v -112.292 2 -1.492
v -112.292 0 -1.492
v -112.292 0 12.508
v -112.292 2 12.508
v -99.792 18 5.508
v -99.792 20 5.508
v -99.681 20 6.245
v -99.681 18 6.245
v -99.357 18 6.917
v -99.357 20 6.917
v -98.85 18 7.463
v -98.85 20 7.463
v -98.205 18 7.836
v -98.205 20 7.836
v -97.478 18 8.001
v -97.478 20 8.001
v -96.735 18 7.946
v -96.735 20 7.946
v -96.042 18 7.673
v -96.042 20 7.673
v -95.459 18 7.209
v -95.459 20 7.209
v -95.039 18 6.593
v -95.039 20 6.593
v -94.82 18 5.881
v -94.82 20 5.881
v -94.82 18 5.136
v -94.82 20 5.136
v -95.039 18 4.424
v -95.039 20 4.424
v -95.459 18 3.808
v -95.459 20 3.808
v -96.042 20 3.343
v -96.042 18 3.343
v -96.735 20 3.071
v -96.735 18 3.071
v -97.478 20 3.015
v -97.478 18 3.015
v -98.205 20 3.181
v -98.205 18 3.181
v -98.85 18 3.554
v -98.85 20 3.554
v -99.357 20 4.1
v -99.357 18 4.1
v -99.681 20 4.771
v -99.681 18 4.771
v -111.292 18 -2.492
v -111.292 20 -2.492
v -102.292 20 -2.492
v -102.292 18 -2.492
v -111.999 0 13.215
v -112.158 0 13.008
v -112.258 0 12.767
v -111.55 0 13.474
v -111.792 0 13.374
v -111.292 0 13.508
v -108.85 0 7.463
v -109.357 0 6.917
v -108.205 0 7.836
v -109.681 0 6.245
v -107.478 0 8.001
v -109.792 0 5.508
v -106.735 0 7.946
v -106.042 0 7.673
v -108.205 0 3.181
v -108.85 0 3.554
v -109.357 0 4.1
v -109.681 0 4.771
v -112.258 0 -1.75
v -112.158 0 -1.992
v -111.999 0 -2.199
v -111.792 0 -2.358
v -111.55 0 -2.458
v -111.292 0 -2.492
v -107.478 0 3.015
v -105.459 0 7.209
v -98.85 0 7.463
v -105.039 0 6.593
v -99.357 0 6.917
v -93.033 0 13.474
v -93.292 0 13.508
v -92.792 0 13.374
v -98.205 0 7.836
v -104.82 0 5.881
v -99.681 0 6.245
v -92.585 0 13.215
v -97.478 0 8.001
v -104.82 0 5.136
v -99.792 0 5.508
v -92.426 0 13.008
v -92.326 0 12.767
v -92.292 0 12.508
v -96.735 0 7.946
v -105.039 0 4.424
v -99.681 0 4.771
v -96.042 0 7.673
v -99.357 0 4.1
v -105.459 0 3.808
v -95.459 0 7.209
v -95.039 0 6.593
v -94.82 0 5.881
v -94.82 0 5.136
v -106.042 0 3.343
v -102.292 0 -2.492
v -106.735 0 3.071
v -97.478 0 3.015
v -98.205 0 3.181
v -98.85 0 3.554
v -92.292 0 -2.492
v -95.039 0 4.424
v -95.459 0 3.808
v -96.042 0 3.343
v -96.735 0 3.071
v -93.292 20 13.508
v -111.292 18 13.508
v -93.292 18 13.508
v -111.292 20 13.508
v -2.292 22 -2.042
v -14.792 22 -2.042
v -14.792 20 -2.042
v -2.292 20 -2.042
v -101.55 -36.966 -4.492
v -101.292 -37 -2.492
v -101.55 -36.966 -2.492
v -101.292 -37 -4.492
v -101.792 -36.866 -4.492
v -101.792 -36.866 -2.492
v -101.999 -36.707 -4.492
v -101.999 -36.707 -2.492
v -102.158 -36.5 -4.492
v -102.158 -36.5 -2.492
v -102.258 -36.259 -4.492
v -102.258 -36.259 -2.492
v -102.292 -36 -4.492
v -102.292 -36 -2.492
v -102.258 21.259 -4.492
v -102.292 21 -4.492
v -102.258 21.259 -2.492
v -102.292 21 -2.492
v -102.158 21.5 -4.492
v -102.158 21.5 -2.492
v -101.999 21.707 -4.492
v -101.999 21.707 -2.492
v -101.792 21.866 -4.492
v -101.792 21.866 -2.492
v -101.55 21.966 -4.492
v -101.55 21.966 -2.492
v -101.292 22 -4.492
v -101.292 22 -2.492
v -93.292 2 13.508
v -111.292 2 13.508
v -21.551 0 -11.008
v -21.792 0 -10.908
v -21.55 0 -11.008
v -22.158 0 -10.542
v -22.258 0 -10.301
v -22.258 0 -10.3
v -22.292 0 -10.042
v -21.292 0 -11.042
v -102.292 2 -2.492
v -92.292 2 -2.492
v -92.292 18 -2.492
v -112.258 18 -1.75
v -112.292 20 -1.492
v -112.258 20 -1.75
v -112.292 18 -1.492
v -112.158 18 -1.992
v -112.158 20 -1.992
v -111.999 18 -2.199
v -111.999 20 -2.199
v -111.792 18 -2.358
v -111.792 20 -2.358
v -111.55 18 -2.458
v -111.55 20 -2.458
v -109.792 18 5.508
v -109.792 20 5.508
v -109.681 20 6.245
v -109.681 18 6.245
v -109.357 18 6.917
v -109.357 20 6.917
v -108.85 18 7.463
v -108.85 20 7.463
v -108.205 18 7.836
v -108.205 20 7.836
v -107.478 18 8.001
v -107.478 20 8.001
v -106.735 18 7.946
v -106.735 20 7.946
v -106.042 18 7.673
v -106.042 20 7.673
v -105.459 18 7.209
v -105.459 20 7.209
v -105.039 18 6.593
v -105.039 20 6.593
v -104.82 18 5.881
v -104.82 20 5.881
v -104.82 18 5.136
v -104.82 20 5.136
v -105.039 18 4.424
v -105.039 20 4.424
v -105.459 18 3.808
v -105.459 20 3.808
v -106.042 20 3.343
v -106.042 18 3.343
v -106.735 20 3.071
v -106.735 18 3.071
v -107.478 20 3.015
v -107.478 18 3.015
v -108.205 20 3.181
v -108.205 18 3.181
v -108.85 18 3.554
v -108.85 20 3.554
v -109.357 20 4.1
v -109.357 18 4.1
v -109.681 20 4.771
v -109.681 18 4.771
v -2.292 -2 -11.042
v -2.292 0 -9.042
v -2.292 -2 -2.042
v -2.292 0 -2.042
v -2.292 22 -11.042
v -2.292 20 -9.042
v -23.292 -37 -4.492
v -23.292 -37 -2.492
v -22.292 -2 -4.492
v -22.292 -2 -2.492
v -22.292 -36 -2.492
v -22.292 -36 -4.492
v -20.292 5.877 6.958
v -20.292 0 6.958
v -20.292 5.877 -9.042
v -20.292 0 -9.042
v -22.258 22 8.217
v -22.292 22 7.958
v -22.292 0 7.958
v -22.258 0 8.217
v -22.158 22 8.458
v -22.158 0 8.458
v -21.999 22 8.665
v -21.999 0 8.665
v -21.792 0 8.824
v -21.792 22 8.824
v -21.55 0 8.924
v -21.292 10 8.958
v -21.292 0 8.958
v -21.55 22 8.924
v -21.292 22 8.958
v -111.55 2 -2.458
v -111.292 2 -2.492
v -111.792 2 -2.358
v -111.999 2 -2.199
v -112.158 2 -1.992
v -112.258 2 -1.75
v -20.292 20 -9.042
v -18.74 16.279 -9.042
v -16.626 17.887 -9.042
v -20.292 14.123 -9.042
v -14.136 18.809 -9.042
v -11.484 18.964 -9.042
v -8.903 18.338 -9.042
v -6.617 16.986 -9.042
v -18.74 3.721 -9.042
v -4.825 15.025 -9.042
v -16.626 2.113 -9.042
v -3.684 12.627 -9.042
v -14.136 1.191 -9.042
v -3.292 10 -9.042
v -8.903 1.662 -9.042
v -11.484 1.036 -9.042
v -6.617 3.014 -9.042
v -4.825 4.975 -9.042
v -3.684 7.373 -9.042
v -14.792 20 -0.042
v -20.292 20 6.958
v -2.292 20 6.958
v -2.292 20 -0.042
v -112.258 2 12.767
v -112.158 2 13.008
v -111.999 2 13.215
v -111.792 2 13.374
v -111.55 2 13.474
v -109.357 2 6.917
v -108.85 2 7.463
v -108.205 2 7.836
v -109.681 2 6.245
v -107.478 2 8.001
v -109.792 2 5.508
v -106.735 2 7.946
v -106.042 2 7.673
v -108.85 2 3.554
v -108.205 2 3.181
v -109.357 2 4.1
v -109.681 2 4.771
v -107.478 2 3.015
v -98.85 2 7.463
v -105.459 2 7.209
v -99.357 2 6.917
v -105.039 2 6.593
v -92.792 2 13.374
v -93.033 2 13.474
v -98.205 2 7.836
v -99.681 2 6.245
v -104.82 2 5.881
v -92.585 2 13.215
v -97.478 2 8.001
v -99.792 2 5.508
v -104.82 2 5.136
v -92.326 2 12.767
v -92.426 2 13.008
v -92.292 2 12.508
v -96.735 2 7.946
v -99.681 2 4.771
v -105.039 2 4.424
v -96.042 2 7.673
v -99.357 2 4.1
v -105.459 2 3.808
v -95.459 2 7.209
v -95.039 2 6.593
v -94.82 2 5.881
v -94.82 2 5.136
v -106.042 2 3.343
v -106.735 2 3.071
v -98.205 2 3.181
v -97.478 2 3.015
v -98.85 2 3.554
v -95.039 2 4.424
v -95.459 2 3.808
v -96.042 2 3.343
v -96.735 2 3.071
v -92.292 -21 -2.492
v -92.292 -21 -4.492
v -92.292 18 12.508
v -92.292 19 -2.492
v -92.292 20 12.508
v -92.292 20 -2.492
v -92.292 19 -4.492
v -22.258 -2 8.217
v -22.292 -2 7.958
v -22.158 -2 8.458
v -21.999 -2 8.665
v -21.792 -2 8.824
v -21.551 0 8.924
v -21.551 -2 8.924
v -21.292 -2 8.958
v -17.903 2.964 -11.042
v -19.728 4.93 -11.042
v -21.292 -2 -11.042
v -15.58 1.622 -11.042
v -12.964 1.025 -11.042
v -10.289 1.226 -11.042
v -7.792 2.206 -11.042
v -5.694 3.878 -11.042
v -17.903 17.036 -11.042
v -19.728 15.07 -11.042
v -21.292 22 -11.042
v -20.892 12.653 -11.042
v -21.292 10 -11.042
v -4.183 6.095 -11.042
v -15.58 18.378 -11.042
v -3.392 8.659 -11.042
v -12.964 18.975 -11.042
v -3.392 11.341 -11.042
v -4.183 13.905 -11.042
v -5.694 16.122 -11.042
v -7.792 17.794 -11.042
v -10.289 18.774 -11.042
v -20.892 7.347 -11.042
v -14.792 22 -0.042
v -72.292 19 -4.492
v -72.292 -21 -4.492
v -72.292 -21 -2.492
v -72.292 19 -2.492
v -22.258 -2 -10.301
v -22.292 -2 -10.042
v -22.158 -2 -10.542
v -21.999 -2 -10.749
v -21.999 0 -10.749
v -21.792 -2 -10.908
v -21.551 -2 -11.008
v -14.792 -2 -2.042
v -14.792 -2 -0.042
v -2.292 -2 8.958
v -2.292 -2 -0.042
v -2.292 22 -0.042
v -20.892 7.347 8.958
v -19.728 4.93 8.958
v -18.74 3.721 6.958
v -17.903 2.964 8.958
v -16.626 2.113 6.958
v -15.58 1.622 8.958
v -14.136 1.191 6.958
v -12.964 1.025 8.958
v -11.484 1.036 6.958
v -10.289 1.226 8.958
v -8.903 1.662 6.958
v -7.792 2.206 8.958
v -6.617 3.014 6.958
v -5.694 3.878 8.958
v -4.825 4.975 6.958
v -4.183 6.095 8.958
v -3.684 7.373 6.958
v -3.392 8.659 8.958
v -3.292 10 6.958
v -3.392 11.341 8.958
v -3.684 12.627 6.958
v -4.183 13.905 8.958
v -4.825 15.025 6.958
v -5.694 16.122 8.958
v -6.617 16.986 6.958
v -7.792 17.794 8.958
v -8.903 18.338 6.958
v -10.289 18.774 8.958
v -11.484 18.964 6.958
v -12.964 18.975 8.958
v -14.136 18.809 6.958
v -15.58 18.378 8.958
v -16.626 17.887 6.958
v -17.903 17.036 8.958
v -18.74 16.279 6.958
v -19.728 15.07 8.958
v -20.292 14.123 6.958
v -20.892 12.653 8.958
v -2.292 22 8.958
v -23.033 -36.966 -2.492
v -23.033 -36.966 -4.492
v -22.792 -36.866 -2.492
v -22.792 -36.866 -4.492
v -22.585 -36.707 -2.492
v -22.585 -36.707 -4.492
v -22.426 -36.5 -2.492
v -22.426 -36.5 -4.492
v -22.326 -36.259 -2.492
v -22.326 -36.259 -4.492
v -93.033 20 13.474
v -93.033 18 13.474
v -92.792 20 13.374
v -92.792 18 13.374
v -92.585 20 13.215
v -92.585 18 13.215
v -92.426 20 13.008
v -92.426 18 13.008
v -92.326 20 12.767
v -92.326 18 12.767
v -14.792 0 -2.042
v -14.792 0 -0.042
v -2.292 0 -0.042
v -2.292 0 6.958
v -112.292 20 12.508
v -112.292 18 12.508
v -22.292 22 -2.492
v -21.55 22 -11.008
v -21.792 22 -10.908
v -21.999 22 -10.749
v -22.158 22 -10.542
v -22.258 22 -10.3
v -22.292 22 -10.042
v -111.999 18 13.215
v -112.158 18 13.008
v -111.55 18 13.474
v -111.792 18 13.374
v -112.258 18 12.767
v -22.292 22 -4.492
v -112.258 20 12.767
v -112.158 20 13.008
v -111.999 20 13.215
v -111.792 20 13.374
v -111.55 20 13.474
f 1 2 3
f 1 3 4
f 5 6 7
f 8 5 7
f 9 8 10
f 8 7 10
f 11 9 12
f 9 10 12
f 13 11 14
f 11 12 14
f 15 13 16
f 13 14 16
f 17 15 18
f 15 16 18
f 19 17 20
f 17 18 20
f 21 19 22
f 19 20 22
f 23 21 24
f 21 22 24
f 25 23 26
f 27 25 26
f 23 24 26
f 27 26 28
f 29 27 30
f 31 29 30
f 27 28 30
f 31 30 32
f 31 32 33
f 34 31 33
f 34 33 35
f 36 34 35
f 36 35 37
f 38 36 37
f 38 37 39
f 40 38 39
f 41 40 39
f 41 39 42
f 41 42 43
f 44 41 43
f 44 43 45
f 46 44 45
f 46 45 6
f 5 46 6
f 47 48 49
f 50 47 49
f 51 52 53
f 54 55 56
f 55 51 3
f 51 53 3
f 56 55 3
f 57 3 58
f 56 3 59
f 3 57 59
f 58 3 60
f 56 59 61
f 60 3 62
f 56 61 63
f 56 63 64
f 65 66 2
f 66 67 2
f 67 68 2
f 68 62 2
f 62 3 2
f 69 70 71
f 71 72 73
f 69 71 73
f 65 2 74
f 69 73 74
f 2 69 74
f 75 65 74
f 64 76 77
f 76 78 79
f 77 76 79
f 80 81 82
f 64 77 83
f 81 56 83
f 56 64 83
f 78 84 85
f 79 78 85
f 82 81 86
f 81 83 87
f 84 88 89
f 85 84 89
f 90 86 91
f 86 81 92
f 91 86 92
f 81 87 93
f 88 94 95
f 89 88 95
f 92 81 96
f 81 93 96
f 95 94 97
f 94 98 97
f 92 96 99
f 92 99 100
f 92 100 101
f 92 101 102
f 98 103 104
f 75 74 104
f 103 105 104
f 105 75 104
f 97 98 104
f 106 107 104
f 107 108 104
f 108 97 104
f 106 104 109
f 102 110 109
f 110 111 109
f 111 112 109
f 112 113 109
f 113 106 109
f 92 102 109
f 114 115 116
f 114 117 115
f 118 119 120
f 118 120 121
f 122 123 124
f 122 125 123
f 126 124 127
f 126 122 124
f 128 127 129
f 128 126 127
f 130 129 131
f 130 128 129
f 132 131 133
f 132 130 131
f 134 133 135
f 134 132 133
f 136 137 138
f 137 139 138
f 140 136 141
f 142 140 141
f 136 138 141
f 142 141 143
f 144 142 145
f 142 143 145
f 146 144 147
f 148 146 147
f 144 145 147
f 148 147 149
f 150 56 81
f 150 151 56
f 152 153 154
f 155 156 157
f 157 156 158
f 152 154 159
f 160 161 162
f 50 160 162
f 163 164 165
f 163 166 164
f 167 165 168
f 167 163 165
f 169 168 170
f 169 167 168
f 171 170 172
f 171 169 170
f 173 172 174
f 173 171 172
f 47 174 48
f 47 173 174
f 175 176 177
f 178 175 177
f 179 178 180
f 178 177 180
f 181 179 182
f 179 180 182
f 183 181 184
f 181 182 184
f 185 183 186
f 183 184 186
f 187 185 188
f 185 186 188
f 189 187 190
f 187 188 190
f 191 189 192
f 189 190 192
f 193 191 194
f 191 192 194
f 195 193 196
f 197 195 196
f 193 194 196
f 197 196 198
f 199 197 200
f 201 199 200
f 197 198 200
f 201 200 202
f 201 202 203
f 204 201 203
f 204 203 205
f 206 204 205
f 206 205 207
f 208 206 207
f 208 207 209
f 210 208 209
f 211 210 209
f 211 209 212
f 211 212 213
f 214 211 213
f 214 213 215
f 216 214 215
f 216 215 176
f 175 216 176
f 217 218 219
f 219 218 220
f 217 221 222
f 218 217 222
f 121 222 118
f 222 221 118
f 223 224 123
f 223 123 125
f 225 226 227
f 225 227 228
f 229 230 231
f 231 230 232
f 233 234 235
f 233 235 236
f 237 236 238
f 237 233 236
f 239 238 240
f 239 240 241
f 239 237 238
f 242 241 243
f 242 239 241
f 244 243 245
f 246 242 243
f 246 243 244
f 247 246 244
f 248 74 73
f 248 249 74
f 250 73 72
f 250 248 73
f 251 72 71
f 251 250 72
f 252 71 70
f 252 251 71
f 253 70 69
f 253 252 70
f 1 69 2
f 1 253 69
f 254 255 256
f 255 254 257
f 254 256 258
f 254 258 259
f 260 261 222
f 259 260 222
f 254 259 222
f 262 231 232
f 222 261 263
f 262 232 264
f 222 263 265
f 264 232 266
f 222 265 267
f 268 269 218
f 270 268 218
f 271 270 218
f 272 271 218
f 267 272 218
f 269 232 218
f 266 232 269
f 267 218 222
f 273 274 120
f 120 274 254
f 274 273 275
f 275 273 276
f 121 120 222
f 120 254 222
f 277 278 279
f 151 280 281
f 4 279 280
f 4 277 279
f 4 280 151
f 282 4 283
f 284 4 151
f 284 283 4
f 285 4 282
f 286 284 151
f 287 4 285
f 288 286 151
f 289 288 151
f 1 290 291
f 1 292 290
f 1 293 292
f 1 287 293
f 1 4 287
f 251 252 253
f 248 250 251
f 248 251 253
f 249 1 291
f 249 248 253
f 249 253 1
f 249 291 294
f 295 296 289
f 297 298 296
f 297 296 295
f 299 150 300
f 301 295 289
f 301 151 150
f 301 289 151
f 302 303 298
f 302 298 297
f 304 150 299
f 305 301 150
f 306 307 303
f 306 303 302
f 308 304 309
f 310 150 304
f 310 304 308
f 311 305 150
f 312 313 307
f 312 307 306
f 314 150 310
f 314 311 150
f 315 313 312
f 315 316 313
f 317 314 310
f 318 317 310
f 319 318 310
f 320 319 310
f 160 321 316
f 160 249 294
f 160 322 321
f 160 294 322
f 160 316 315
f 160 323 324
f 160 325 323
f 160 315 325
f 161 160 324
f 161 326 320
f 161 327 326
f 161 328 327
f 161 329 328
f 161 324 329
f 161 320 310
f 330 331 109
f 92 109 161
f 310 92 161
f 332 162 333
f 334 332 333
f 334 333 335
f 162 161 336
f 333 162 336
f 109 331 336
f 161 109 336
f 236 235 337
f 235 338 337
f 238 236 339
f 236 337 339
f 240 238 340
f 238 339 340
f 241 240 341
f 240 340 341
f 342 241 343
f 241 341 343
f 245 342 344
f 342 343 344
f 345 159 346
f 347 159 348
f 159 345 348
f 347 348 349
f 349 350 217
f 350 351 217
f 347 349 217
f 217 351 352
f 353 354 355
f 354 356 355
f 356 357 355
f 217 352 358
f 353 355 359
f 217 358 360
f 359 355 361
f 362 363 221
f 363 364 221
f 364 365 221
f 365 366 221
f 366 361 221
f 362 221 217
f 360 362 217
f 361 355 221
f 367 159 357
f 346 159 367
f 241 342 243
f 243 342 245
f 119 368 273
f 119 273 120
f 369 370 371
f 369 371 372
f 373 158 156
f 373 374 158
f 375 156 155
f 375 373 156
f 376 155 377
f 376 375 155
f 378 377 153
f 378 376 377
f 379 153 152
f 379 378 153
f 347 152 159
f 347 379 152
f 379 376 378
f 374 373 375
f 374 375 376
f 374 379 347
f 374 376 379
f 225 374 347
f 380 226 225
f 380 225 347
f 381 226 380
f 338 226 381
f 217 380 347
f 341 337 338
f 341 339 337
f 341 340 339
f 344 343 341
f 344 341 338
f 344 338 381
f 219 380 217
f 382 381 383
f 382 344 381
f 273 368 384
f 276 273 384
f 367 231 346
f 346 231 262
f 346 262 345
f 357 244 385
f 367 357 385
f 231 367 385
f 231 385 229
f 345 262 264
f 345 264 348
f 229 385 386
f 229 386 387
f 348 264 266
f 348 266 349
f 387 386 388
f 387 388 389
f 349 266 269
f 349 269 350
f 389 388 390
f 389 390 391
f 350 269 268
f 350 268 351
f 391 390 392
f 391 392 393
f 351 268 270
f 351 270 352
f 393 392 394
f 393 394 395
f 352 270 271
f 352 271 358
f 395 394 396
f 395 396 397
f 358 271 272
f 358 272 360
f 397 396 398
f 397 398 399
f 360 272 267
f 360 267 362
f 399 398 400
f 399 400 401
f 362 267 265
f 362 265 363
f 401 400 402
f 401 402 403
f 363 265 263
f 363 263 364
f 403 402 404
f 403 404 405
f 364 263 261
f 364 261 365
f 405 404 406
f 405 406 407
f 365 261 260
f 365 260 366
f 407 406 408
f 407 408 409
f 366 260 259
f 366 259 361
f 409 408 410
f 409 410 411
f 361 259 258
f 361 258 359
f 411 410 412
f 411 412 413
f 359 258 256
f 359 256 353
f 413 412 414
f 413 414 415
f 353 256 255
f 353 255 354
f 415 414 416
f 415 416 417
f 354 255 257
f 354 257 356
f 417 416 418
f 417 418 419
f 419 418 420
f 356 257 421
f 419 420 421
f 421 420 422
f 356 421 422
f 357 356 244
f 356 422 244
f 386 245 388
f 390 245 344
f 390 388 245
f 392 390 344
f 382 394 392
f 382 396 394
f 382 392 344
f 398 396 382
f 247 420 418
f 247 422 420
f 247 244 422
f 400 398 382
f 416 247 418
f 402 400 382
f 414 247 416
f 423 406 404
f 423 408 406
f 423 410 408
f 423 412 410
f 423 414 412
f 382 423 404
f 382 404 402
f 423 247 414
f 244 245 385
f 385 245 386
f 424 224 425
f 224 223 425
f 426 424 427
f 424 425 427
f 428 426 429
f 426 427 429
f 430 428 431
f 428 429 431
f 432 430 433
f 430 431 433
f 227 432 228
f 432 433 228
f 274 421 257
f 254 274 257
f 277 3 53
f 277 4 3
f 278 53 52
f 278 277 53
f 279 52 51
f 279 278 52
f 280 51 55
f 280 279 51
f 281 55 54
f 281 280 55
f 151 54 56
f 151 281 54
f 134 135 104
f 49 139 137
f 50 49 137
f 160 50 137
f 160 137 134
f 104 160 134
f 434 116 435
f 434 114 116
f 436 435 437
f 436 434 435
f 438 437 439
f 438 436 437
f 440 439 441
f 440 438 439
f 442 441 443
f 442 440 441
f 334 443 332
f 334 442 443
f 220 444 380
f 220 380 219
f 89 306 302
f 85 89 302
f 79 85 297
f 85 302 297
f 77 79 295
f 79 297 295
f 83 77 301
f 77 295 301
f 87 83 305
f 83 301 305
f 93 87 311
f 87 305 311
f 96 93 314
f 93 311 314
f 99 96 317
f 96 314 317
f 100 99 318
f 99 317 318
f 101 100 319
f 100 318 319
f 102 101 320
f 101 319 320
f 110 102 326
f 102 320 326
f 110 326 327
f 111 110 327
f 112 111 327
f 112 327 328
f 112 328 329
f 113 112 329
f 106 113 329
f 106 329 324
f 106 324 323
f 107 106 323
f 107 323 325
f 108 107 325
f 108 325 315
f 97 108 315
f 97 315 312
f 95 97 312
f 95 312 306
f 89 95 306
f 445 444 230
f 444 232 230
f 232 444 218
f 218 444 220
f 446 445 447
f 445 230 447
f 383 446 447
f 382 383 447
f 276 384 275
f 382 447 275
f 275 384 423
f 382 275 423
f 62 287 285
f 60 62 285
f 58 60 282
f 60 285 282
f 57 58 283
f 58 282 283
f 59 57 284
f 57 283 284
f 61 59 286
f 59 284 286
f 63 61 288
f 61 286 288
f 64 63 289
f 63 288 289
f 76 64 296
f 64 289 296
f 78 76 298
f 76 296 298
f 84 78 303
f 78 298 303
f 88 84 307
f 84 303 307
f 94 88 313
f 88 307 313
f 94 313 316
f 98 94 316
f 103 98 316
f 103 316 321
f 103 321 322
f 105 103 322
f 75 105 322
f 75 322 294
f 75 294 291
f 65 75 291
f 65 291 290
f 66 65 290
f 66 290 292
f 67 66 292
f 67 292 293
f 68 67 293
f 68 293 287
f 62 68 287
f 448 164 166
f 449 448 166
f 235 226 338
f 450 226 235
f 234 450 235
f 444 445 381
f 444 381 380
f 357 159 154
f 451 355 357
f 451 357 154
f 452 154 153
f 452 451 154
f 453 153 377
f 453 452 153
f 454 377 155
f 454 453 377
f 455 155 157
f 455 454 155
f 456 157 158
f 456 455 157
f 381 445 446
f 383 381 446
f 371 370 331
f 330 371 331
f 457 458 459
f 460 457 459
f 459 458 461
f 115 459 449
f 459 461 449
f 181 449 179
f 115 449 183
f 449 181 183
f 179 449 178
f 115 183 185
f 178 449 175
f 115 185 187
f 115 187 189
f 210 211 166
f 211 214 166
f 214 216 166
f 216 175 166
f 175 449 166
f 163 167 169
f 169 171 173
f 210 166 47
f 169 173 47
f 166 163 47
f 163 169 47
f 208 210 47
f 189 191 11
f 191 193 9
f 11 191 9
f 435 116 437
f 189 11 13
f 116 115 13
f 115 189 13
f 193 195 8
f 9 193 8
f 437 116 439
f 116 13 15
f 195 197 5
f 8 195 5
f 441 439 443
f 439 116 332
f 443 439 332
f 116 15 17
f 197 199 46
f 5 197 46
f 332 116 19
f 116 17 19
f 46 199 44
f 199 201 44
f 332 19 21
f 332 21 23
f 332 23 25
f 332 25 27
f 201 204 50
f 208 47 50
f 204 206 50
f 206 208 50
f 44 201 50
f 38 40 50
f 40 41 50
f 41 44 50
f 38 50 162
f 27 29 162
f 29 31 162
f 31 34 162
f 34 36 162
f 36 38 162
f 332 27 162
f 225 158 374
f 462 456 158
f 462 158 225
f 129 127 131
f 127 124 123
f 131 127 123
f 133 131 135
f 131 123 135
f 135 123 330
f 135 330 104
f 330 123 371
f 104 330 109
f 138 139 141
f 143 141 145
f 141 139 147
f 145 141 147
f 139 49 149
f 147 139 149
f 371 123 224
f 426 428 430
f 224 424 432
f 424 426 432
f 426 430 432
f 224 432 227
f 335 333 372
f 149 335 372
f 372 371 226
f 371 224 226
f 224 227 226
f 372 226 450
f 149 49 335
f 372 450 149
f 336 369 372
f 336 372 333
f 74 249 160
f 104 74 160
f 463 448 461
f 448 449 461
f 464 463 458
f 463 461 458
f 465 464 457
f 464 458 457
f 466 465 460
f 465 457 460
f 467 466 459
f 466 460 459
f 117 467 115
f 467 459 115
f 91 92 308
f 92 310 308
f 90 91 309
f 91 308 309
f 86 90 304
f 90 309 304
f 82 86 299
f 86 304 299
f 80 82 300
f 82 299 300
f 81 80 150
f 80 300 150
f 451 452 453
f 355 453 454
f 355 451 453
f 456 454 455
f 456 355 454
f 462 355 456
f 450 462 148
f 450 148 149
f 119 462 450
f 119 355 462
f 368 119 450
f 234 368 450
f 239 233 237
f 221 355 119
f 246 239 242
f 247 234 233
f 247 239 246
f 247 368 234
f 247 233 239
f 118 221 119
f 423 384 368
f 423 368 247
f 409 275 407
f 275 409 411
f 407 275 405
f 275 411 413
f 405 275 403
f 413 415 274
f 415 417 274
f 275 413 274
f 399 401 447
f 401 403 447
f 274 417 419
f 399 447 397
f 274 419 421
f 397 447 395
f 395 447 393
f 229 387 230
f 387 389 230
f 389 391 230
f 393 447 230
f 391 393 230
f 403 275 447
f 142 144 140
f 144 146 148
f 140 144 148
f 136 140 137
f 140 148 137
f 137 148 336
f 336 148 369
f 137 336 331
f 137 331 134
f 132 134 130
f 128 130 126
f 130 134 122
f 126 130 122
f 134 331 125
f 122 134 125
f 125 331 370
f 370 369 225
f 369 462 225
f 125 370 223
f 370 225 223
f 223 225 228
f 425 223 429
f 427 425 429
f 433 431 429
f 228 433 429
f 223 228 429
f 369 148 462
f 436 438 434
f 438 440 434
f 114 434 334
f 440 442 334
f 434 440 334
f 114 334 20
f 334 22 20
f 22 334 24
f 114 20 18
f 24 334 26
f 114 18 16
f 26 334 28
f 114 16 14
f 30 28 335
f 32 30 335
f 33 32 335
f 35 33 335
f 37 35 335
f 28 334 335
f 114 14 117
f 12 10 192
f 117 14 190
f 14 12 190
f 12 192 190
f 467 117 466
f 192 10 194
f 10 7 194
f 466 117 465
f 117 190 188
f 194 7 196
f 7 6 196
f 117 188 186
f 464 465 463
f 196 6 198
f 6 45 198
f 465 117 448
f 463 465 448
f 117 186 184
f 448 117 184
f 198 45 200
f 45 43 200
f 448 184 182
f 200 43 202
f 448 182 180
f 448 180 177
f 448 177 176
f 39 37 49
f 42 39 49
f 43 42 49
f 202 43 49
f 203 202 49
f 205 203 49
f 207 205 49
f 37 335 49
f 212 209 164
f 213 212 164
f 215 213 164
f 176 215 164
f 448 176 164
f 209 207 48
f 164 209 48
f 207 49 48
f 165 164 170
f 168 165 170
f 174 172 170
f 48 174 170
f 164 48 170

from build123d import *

# Parameters (mm, degrees)
BOSS_EXTRUDE1_DEPTH = 20
FILLET1_R           = 1
SKETCH2_R           = 9
CUT_EXTRUDE1_DEPTH  = 20
BOSS_EXTRUDE2_START = 2
BOSS_EXTRUDE2_DEPTH = 2
SKETCH4_W           = 20
SKETCH4_H           = 20
BOSS_EXTRUDE3_DEPTH = 2
FILLET2_R           = 1
SKETCH5_W           = 12.5
SKETCH5_H           = 2
CUT_EXTRUDE2_DEPTH  = 24
BOSS_EXTRUDE4_DEPTH = 80
FILLET3_R           = 1
SKETCH8_R           = 7.11392485
SKETCH8_W           = 20
SKETCH8_H           = 40
CUT_EXTRUDE3_DEPTH  = 2
SKETCH9_W           = 20
SKETCH9_H           = 2
BOSS_EXTRUDE5_DEPTH = 16
FILLET4_R           = 1
SKETCH10_R          = 2.5
CUT_EXTRUDE4_DEPTH  = 20


with BuildPart() as part:
    # Sketch1 → Boss-Extrude1 (new body)
    with BuildSketch(Plane(origin=(0, 0, 0), x_dir=(1, 0, 0), z_dir=(0, 1, 0))):
        Polygon((-2.291666667, 11.041666667), (-22.291666667, 11.041666667), (-22.291666667, -8.958333333), (-2.291666667, -8.958333333), (-2.291666667, -6.958333333), (-20.291666667, -6.958333333), (-20.291666667, 9.041666667), (-2.291666667, 9.041666667), align=None)
    extrude(amount=BOSS_EXTRUDE1_DEPTH)

    # Fillet1
    fillet1_edges = [part.edges().sort_by_distance(p)[0] for p in [
        (-22.291666667, 10, 8.958333333),
        (-22.291666667, 10, -11.041666667),
    ]]
    fillet(fillet1_edges, radius=FILLET1_R)

    # Sketch2 → Cut-Extrude1 (cut)
    with BuildSketch(Plane.XY.offset(8.958333333)):
        with Locations(Location((-12.291666667, 10, 0), (0, 0, 180))):
            Circle(SKETCH2_R)
    extrude(amount=-CUT_EXTRUDE1_DEPTH, mode=Mode.SUBTRACT)

    # Sketch3 → Boss-Extrude2 (add)
    with BuildSketch(Plane(origin=(0, 20, 0), x_dir=(1, 0, 0), z_dir=(0, 1, 0)).offset(BOSS_EXTRUDE2_START)):
        Polygon((-2.291666667, 2.377848536), (-2.291666667, 9.041666667), (-20.291666667, 9.041666667), (-20.291666667, -6.958333333), (-2.291666667, -6.958333333), (-2.291666667, 0.377848536), align=None)
        with BuildLine():
            Line((-2.291666667, 9.041666667), (-2.291666667, 11.041666667))
            Line((-2.291666667, 11.041666667), (-21.291666667, 11.041666667))
            ThreePointArc((-21.291666667, 11.041666667), (-21.998773448, 10.748773448), (-22.291666667, 10.041666667))
            Line((-22.291666667, 10.041666667), (-22.291666667, -7.958333333))
            ThreePointArc((-22.291666667, -7.958333333), (-21.998773448, -8.665440115), (-21.291666667, -8.958333333))
            Line((-21.291666667, -8.958333333), (-2.291666667, -8.958333333))
            Line((-2.291666667, -8.958333333), (-2.291666667, -6.958333333))
            Line((-2.291666667, -6.958333333), (-20.291666667, -6.958333333))
            Line((-20.291666667, -6.958333333), (-20.291666667, 9.041666667))
            Line((-20.291666667, 9.041666667), (-2.291666667, 9.041666667))
        make_face()
    extrude(amount=-BOSS_EXTRUDE2_DEPTH)

    # Sketch4 → Boss-Extrude3 (add)
    with BuildSketch(Plane.XZ):
        with Locations((-12.291666667, -1.041666667)):
            Rectangle(SKETCH4_W, SKETCH4_H)
    extrude(amount=BOSS_EXTRUDE3_DEPTH)

    # Fillet2
    fillet2_edges = [part.edges().sort_by_distance(p)[0] for p in [
        (-22.291666667, -1, -11.041666667),
        (-22.291666667, -1, 8.958333333),
    ]]
    fillet(fillet2_edges, radius=FILLET2_R - 0.0001)  # a hair under: the kernel refuses the full size

    # Sketch5 → Cut-Extrude2 (cut)
    with BuildSketch(Plane(origin=(0, 22, 0), x_dir=(1, 0, 0), z_dir=(0, 1, 0))):
        with Locations((-8.541666667, 1.041666667)):
            Rectangle(SKETCH5_W, SKETCH5_H)
    extrude(amount=-CUT_EXTRUDE2_DEPTH, mode=Mode.SUBTRACT)

    # Sketch6 → Boss-Extrude4 (add)
    with BuildSketch(Plane.ZY.offset(22.291666667)):
        Polygon((-2.491666667, -37), (-4.491666667, -37), (-4.491666667, -2), (-4.491666667, 22), (-2.491666667, 22), (-2.491666667, -2), align=None)
    extrude(amount=BOSS_EXTRUDE4_DEPTH)

    # Fillet3
    fillet3_edges = [part.edges().sort_by_distance(p)[0] for p in [
        (-22.291666667, -37, -3.491666667),
        (-102.291666667, 22, -3.491666667),
        (-102.291666667, -37, -3.491666667),
    ]]
    fillet(fillet3_edges, radius=FILLET3_R)

    # Sketch8 → Cut-Extrude3 (cut)
    with BuildSketch(Plane(origin=(0, 0, -4.491666667), x_dir=(-1, 0, 0), z_dir=(0, 0, -1))):
        with Locations((12.291666667, 10)):
            Circle(SKETCH8_R)
        with Locations((82.291666667, -1)):
            Rectangle(SKETCH8_W, SKETCH8_H)
    extrude(amount=-CUT_EXTRUDE3_DEPTH, mode=Mode.SUBTRACT)

    # Sketch9 → Boss-Extrude5 (add)
    with BuildSketch(Plane.XY.offset(-2.491666667)):
        Polygon((-92.823958121, 20), (-112.291666667, 20), (-112.291666667, 18), (-92.291666667, 18), (-92.291666667, 20), align=None)
        with Locations((-102.291666667, 1)):
            Rectangle(SKETCH9_W, SKETCH9_H)
    extrude(amount=BOSS_EXTRUDE5_DEPTH)

    # Fillet4
    fillet4_edges = [part.edges().sort_by_distance(p)[0] for p in [
        (-112.291666667, 19, -2.491666667),
        (-112.291666667, 19, 13.508333333),
        (-92.291666667, 19, 13.508333333),
        (-112.291666667, 1, -2.491666667),
        (-92.291666667, 1, 13.508333333),
        (-112.291666667, 1, 13.508333333),
    ]]
    fillet(fillet4_edges, radius=FILLET4_R)

    # Sketch10 → Cut-Extrude4 (cut)
    with BuildSketch(Plane(origin=(0, 20, 0), x_dir=(1, 0, 0), z_dir=(0, 1, 0))):
        with Locations(Location((-97.291666667, -5.508333333, 0), (0, 0, 180))):
            Circle(SKETCH10_R)
        with Locations(Location((-107.291666667, -5.508333333, 0), (0, 0, 180))):
            Circle(SKETCH10_R)
    extrude(amount=-CUT_EXTRUDE4_DEPTH, mode=Mode.SUBTRACT)


solid = part.part
